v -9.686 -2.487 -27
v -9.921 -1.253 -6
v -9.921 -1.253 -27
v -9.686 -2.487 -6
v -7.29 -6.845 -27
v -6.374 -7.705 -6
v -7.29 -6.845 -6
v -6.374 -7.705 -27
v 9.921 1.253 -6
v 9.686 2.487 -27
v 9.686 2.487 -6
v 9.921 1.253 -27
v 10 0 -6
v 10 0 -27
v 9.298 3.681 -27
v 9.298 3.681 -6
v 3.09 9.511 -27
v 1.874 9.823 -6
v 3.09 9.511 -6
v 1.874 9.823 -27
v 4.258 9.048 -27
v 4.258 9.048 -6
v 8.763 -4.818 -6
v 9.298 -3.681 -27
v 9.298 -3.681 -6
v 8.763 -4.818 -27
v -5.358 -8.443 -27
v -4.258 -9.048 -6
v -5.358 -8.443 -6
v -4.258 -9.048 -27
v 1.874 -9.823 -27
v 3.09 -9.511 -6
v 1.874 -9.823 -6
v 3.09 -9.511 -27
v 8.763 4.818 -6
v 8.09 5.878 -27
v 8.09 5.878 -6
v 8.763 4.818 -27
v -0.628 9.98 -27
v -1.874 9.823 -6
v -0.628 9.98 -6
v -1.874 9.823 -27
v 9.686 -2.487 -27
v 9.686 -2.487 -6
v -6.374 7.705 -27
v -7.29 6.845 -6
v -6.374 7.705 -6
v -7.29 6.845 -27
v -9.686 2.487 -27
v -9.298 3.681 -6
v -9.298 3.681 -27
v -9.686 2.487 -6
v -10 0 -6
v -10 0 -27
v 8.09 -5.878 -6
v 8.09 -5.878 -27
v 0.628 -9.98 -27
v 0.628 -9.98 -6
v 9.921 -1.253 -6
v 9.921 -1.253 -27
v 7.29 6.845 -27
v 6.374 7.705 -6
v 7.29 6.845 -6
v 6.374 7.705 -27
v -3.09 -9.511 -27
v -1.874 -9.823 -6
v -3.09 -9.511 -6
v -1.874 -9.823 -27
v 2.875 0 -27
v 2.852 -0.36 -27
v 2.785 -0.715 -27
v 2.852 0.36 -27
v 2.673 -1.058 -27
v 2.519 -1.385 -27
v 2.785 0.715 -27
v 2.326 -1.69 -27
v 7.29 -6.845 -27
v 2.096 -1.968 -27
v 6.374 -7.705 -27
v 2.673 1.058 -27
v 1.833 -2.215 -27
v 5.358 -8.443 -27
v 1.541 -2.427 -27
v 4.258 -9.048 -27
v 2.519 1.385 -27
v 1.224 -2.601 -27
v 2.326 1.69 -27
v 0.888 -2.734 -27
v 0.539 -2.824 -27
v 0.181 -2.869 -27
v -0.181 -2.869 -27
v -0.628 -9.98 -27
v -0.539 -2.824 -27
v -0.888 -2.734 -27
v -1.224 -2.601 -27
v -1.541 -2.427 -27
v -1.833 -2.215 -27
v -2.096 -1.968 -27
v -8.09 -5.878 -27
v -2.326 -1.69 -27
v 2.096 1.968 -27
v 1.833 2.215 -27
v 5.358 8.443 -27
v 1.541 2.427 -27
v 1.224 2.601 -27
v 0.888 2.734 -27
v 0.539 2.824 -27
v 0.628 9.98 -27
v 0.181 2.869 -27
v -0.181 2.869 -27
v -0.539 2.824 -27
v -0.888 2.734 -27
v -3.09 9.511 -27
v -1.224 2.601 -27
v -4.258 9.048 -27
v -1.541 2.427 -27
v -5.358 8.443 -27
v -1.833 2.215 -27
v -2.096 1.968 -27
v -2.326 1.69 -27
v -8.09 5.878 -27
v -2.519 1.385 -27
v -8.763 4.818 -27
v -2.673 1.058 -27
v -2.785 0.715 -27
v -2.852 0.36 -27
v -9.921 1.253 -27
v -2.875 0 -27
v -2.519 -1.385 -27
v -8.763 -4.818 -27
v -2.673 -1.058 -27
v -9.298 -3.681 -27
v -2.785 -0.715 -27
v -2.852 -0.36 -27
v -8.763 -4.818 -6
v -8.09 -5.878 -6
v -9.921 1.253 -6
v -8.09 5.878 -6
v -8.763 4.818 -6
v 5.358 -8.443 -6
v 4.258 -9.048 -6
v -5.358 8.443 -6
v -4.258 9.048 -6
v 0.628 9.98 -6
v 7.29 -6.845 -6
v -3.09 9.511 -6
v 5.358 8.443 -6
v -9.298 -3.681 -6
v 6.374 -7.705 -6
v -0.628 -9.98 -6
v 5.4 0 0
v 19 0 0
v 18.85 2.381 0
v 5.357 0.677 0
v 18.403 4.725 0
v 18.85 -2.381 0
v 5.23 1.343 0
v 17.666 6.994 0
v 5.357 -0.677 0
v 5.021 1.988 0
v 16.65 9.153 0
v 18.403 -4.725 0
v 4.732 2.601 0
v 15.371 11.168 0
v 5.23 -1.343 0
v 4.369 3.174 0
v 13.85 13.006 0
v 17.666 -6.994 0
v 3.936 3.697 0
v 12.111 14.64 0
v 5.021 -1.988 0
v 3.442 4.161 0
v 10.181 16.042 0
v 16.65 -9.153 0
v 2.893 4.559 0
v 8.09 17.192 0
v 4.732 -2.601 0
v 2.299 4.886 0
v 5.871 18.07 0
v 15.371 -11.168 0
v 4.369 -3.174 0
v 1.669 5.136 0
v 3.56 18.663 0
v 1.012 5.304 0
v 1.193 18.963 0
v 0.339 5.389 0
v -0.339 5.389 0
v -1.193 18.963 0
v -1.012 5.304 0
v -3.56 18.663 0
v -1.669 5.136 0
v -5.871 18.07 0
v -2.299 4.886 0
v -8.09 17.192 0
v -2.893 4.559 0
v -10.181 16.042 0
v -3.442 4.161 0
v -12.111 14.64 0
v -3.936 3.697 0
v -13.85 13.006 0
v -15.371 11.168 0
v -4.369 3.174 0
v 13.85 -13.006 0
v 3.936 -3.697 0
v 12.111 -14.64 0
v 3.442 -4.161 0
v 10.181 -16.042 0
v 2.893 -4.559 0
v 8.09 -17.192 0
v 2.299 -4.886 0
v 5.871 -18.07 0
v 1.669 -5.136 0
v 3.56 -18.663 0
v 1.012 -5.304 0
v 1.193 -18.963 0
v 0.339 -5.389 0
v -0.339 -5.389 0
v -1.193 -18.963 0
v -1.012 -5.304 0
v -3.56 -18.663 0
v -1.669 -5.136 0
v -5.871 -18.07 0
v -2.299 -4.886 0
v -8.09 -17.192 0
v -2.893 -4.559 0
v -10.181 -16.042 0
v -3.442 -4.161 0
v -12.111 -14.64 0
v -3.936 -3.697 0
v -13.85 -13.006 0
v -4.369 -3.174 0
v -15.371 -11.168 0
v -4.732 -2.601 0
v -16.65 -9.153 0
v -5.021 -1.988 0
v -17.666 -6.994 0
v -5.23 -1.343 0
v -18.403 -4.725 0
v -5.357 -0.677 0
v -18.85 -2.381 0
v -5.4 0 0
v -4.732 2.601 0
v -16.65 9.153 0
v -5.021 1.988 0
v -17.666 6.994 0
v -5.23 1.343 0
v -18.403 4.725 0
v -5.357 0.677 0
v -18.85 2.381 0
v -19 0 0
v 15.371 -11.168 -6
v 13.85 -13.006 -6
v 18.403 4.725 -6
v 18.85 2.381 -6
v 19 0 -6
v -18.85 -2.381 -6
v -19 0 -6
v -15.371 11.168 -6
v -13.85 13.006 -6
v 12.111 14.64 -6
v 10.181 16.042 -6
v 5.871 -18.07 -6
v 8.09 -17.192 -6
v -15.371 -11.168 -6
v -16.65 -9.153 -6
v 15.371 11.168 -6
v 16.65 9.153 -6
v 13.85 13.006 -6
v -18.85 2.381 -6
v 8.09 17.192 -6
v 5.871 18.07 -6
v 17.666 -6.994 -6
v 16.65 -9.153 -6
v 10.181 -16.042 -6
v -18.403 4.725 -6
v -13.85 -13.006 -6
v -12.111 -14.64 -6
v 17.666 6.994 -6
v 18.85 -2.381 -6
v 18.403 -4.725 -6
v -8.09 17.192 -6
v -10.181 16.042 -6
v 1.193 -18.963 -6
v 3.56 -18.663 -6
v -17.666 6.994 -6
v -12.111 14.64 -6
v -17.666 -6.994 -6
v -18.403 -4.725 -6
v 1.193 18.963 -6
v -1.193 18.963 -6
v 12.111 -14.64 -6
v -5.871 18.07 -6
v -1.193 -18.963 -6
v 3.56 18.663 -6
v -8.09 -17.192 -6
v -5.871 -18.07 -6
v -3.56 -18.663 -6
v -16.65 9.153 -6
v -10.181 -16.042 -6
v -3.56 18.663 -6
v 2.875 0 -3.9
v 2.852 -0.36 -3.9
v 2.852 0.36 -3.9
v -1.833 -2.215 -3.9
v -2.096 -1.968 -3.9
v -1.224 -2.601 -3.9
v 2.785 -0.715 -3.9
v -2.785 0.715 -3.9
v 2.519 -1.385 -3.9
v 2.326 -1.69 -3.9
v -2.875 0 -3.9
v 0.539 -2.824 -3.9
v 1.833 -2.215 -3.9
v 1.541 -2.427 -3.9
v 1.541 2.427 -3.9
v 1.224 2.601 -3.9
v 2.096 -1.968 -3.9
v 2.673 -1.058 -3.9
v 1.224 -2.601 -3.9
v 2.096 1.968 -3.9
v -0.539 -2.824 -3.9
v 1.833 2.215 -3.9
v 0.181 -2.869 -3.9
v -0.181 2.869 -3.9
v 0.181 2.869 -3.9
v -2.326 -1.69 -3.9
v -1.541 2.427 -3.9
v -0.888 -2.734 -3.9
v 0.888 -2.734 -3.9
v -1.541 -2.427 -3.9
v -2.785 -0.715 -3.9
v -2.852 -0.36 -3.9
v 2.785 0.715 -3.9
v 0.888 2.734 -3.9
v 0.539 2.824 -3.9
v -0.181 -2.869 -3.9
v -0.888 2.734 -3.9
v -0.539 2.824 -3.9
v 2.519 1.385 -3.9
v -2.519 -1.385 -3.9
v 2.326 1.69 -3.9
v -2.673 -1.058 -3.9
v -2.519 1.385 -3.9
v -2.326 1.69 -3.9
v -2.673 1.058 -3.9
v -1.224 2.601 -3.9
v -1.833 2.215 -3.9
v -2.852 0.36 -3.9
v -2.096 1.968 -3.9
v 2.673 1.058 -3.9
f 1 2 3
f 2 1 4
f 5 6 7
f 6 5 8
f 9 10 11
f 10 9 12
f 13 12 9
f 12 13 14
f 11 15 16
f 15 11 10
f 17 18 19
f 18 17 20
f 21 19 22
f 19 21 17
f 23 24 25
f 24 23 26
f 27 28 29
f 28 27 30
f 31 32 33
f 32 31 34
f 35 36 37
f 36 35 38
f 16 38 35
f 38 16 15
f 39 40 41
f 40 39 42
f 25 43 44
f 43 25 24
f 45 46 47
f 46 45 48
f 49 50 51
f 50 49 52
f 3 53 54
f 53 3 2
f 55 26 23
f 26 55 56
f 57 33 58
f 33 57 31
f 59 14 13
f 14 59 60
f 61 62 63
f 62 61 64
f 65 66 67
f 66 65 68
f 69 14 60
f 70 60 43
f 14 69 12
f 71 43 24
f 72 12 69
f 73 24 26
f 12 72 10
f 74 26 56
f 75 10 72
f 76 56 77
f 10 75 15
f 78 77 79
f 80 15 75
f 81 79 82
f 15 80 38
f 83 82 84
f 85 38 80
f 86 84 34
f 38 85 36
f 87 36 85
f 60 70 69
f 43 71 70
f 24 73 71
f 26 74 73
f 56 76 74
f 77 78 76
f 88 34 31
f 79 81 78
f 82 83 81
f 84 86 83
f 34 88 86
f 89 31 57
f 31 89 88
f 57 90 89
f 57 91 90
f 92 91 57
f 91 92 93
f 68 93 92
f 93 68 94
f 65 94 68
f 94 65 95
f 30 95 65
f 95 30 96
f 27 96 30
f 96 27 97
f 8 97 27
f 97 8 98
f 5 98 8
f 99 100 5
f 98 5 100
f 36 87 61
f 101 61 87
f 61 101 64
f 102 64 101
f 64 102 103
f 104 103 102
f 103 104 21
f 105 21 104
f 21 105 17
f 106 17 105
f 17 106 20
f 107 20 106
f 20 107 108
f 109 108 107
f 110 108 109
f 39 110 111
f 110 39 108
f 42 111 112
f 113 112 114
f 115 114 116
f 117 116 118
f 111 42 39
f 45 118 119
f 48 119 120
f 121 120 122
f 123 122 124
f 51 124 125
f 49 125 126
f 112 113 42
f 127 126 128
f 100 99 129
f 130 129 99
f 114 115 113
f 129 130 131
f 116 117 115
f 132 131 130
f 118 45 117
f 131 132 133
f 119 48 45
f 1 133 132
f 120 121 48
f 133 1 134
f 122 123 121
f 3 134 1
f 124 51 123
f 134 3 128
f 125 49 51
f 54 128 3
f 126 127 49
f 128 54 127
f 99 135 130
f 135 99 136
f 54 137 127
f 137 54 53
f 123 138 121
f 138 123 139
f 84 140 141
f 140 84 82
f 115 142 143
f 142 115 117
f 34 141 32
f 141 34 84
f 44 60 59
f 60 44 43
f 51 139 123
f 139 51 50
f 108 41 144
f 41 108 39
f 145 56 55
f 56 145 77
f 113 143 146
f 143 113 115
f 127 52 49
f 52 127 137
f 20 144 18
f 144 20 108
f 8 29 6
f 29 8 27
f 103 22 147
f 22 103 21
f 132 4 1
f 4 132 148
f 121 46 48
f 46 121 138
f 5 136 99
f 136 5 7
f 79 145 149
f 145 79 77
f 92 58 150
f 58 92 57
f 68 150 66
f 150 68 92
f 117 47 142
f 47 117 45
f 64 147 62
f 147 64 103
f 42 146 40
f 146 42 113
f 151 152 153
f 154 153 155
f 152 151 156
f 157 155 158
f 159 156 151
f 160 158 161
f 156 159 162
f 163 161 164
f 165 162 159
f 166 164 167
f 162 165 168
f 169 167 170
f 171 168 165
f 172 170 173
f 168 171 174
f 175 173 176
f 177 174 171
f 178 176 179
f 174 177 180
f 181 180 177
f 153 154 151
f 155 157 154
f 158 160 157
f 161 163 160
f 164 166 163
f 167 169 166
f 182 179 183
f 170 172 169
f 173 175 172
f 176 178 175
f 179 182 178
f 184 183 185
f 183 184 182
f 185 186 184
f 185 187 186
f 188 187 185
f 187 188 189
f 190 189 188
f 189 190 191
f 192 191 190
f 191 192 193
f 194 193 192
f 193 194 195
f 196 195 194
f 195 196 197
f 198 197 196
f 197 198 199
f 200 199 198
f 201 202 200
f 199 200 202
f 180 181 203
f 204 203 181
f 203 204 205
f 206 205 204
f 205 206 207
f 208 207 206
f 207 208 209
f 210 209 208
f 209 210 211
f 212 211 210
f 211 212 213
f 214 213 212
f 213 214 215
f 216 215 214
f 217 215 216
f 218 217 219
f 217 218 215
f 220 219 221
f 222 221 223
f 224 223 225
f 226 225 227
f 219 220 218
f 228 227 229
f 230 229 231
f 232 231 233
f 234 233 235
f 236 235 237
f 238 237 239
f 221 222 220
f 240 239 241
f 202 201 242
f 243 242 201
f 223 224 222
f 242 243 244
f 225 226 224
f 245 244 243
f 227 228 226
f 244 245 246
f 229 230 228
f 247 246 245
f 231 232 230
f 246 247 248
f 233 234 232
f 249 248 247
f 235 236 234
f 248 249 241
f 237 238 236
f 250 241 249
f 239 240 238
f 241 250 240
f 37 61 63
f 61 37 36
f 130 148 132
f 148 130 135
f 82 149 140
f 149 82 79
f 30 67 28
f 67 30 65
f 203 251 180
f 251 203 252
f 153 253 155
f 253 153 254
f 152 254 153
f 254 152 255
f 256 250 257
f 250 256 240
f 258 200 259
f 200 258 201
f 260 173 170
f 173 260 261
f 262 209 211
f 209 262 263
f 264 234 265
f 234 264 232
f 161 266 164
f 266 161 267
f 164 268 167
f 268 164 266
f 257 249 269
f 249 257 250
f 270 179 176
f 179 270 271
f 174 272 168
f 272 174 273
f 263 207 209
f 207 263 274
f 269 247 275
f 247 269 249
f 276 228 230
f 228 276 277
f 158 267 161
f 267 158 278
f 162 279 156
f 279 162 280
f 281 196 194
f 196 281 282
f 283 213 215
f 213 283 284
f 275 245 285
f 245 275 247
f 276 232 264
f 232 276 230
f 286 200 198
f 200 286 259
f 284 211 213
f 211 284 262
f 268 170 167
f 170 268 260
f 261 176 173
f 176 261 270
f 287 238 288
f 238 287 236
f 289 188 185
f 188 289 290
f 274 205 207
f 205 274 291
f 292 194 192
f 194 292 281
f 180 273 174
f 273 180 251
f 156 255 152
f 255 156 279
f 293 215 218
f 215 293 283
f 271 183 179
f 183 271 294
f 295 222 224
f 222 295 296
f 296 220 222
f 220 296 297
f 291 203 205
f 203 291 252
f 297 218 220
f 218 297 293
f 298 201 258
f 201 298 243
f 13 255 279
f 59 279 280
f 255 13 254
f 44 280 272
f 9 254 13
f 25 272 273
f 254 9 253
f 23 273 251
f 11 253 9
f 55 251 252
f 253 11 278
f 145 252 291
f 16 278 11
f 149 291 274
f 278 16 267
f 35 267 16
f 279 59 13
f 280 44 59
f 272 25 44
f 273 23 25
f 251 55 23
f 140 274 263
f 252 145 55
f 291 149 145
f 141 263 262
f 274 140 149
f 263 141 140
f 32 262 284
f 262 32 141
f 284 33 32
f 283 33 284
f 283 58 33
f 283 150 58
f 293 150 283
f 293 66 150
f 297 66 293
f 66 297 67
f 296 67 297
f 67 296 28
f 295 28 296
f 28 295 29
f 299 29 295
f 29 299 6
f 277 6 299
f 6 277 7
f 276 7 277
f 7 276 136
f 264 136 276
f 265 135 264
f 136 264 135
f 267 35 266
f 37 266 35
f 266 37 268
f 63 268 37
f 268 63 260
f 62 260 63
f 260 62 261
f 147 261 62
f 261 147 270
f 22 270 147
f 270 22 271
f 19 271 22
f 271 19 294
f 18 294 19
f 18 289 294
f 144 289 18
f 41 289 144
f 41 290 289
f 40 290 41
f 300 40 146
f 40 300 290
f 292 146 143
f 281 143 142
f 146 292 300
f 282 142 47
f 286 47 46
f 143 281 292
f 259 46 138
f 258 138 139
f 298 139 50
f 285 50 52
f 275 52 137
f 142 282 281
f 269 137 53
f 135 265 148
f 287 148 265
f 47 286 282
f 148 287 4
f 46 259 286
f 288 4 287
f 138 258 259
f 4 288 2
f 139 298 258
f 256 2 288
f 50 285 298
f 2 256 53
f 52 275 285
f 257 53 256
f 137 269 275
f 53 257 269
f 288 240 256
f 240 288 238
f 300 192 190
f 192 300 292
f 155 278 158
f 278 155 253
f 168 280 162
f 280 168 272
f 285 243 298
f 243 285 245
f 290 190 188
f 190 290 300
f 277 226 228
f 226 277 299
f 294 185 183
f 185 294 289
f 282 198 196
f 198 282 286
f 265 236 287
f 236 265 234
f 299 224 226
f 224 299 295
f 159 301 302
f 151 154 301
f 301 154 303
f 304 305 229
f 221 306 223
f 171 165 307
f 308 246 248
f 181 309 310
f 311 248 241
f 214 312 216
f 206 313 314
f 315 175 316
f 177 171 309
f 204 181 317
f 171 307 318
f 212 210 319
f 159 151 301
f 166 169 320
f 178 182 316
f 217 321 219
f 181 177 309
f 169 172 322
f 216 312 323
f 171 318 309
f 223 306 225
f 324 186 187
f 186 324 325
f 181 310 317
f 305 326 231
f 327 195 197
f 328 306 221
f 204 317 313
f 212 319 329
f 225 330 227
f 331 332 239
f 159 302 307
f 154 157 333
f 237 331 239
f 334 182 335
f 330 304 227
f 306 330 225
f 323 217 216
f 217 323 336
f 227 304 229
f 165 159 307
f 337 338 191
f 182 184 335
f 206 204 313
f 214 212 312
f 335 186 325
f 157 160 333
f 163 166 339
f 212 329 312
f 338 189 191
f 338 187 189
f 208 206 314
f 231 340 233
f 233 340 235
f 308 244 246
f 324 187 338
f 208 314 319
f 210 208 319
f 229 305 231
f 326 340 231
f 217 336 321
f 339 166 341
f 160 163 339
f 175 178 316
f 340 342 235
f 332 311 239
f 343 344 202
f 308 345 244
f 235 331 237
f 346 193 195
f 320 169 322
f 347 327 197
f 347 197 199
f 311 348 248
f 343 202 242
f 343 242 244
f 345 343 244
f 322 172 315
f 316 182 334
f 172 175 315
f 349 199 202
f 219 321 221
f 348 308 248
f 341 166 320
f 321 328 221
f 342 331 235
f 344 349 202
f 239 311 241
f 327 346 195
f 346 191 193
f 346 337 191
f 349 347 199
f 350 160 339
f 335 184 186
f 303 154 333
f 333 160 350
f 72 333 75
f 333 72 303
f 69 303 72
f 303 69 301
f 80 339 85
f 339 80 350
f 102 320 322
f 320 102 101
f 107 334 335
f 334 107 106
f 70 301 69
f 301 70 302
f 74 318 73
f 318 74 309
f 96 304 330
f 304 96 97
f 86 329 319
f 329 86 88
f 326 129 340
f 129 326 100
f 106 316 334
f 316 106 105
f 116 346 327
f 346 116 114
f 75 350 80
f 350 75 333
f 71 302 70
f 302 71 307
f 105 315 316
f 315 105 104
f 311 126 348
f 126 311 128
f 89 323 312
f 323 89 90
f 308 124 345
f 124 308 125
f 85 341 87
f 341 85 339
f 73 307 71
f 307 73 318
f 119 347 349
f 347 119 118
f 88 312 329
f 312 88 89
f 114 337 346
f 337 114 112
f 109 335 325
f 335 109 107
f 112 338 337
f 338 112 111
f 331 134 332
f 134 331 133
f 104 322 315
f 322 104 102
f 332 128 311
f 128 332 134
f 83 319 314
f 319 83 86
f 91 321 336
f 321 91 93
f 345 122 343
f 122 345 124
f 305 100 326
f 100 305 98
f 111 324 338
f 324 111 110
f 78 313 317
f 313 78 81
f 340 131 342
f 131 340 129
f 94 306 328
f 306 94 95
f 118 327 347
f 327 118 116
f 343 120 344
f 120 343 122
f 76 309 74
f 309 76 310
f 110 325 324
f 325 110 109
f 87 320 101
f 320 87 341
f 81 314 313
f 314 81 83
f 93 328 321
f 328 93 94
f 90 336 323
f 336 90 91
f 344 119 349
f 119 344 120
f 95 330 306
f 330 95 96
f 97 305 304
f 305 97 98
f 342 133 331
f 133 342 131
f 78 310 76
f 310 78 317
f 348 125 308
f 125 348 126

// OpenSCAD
$fn = 50;


difference() {
	union() {
		translate(v = [0, 0, -27.0000000000]) {
			cylinder(h = 27, r = 10.0000000000);
		}
		translate(v = [0, 0, -6.0000000000]) {
			cylinder(h = 6, r = 19.0000000000);
		}
	}
	union() {
		translate(v = [0, 0, 0]) {
			rotate(a = [0, 0, 0]) {
				difference() {
					union() {
						#translate(v = [0, 0, -27.0000000000]) {
							cylinder(h = 27, r = 2.6000000000);
						}
						#translate(v = [0, 0, -3.9000000000]) {
							cylinder(h = 3.9000000000, r1 = 2.8750000000, r2 = 5.4000000000);
						}
						#translate(v = [0, 0, -27.0000000000]) {
							cylinder(h = 27, r = 2.8750000000);
						}
						#translate(v = [0, 0, -27.0000000000]) {
							cylinder(h = 27, r = 2.6000000000);
						}
					}
					union();
				}
			}
		}
	}
}
